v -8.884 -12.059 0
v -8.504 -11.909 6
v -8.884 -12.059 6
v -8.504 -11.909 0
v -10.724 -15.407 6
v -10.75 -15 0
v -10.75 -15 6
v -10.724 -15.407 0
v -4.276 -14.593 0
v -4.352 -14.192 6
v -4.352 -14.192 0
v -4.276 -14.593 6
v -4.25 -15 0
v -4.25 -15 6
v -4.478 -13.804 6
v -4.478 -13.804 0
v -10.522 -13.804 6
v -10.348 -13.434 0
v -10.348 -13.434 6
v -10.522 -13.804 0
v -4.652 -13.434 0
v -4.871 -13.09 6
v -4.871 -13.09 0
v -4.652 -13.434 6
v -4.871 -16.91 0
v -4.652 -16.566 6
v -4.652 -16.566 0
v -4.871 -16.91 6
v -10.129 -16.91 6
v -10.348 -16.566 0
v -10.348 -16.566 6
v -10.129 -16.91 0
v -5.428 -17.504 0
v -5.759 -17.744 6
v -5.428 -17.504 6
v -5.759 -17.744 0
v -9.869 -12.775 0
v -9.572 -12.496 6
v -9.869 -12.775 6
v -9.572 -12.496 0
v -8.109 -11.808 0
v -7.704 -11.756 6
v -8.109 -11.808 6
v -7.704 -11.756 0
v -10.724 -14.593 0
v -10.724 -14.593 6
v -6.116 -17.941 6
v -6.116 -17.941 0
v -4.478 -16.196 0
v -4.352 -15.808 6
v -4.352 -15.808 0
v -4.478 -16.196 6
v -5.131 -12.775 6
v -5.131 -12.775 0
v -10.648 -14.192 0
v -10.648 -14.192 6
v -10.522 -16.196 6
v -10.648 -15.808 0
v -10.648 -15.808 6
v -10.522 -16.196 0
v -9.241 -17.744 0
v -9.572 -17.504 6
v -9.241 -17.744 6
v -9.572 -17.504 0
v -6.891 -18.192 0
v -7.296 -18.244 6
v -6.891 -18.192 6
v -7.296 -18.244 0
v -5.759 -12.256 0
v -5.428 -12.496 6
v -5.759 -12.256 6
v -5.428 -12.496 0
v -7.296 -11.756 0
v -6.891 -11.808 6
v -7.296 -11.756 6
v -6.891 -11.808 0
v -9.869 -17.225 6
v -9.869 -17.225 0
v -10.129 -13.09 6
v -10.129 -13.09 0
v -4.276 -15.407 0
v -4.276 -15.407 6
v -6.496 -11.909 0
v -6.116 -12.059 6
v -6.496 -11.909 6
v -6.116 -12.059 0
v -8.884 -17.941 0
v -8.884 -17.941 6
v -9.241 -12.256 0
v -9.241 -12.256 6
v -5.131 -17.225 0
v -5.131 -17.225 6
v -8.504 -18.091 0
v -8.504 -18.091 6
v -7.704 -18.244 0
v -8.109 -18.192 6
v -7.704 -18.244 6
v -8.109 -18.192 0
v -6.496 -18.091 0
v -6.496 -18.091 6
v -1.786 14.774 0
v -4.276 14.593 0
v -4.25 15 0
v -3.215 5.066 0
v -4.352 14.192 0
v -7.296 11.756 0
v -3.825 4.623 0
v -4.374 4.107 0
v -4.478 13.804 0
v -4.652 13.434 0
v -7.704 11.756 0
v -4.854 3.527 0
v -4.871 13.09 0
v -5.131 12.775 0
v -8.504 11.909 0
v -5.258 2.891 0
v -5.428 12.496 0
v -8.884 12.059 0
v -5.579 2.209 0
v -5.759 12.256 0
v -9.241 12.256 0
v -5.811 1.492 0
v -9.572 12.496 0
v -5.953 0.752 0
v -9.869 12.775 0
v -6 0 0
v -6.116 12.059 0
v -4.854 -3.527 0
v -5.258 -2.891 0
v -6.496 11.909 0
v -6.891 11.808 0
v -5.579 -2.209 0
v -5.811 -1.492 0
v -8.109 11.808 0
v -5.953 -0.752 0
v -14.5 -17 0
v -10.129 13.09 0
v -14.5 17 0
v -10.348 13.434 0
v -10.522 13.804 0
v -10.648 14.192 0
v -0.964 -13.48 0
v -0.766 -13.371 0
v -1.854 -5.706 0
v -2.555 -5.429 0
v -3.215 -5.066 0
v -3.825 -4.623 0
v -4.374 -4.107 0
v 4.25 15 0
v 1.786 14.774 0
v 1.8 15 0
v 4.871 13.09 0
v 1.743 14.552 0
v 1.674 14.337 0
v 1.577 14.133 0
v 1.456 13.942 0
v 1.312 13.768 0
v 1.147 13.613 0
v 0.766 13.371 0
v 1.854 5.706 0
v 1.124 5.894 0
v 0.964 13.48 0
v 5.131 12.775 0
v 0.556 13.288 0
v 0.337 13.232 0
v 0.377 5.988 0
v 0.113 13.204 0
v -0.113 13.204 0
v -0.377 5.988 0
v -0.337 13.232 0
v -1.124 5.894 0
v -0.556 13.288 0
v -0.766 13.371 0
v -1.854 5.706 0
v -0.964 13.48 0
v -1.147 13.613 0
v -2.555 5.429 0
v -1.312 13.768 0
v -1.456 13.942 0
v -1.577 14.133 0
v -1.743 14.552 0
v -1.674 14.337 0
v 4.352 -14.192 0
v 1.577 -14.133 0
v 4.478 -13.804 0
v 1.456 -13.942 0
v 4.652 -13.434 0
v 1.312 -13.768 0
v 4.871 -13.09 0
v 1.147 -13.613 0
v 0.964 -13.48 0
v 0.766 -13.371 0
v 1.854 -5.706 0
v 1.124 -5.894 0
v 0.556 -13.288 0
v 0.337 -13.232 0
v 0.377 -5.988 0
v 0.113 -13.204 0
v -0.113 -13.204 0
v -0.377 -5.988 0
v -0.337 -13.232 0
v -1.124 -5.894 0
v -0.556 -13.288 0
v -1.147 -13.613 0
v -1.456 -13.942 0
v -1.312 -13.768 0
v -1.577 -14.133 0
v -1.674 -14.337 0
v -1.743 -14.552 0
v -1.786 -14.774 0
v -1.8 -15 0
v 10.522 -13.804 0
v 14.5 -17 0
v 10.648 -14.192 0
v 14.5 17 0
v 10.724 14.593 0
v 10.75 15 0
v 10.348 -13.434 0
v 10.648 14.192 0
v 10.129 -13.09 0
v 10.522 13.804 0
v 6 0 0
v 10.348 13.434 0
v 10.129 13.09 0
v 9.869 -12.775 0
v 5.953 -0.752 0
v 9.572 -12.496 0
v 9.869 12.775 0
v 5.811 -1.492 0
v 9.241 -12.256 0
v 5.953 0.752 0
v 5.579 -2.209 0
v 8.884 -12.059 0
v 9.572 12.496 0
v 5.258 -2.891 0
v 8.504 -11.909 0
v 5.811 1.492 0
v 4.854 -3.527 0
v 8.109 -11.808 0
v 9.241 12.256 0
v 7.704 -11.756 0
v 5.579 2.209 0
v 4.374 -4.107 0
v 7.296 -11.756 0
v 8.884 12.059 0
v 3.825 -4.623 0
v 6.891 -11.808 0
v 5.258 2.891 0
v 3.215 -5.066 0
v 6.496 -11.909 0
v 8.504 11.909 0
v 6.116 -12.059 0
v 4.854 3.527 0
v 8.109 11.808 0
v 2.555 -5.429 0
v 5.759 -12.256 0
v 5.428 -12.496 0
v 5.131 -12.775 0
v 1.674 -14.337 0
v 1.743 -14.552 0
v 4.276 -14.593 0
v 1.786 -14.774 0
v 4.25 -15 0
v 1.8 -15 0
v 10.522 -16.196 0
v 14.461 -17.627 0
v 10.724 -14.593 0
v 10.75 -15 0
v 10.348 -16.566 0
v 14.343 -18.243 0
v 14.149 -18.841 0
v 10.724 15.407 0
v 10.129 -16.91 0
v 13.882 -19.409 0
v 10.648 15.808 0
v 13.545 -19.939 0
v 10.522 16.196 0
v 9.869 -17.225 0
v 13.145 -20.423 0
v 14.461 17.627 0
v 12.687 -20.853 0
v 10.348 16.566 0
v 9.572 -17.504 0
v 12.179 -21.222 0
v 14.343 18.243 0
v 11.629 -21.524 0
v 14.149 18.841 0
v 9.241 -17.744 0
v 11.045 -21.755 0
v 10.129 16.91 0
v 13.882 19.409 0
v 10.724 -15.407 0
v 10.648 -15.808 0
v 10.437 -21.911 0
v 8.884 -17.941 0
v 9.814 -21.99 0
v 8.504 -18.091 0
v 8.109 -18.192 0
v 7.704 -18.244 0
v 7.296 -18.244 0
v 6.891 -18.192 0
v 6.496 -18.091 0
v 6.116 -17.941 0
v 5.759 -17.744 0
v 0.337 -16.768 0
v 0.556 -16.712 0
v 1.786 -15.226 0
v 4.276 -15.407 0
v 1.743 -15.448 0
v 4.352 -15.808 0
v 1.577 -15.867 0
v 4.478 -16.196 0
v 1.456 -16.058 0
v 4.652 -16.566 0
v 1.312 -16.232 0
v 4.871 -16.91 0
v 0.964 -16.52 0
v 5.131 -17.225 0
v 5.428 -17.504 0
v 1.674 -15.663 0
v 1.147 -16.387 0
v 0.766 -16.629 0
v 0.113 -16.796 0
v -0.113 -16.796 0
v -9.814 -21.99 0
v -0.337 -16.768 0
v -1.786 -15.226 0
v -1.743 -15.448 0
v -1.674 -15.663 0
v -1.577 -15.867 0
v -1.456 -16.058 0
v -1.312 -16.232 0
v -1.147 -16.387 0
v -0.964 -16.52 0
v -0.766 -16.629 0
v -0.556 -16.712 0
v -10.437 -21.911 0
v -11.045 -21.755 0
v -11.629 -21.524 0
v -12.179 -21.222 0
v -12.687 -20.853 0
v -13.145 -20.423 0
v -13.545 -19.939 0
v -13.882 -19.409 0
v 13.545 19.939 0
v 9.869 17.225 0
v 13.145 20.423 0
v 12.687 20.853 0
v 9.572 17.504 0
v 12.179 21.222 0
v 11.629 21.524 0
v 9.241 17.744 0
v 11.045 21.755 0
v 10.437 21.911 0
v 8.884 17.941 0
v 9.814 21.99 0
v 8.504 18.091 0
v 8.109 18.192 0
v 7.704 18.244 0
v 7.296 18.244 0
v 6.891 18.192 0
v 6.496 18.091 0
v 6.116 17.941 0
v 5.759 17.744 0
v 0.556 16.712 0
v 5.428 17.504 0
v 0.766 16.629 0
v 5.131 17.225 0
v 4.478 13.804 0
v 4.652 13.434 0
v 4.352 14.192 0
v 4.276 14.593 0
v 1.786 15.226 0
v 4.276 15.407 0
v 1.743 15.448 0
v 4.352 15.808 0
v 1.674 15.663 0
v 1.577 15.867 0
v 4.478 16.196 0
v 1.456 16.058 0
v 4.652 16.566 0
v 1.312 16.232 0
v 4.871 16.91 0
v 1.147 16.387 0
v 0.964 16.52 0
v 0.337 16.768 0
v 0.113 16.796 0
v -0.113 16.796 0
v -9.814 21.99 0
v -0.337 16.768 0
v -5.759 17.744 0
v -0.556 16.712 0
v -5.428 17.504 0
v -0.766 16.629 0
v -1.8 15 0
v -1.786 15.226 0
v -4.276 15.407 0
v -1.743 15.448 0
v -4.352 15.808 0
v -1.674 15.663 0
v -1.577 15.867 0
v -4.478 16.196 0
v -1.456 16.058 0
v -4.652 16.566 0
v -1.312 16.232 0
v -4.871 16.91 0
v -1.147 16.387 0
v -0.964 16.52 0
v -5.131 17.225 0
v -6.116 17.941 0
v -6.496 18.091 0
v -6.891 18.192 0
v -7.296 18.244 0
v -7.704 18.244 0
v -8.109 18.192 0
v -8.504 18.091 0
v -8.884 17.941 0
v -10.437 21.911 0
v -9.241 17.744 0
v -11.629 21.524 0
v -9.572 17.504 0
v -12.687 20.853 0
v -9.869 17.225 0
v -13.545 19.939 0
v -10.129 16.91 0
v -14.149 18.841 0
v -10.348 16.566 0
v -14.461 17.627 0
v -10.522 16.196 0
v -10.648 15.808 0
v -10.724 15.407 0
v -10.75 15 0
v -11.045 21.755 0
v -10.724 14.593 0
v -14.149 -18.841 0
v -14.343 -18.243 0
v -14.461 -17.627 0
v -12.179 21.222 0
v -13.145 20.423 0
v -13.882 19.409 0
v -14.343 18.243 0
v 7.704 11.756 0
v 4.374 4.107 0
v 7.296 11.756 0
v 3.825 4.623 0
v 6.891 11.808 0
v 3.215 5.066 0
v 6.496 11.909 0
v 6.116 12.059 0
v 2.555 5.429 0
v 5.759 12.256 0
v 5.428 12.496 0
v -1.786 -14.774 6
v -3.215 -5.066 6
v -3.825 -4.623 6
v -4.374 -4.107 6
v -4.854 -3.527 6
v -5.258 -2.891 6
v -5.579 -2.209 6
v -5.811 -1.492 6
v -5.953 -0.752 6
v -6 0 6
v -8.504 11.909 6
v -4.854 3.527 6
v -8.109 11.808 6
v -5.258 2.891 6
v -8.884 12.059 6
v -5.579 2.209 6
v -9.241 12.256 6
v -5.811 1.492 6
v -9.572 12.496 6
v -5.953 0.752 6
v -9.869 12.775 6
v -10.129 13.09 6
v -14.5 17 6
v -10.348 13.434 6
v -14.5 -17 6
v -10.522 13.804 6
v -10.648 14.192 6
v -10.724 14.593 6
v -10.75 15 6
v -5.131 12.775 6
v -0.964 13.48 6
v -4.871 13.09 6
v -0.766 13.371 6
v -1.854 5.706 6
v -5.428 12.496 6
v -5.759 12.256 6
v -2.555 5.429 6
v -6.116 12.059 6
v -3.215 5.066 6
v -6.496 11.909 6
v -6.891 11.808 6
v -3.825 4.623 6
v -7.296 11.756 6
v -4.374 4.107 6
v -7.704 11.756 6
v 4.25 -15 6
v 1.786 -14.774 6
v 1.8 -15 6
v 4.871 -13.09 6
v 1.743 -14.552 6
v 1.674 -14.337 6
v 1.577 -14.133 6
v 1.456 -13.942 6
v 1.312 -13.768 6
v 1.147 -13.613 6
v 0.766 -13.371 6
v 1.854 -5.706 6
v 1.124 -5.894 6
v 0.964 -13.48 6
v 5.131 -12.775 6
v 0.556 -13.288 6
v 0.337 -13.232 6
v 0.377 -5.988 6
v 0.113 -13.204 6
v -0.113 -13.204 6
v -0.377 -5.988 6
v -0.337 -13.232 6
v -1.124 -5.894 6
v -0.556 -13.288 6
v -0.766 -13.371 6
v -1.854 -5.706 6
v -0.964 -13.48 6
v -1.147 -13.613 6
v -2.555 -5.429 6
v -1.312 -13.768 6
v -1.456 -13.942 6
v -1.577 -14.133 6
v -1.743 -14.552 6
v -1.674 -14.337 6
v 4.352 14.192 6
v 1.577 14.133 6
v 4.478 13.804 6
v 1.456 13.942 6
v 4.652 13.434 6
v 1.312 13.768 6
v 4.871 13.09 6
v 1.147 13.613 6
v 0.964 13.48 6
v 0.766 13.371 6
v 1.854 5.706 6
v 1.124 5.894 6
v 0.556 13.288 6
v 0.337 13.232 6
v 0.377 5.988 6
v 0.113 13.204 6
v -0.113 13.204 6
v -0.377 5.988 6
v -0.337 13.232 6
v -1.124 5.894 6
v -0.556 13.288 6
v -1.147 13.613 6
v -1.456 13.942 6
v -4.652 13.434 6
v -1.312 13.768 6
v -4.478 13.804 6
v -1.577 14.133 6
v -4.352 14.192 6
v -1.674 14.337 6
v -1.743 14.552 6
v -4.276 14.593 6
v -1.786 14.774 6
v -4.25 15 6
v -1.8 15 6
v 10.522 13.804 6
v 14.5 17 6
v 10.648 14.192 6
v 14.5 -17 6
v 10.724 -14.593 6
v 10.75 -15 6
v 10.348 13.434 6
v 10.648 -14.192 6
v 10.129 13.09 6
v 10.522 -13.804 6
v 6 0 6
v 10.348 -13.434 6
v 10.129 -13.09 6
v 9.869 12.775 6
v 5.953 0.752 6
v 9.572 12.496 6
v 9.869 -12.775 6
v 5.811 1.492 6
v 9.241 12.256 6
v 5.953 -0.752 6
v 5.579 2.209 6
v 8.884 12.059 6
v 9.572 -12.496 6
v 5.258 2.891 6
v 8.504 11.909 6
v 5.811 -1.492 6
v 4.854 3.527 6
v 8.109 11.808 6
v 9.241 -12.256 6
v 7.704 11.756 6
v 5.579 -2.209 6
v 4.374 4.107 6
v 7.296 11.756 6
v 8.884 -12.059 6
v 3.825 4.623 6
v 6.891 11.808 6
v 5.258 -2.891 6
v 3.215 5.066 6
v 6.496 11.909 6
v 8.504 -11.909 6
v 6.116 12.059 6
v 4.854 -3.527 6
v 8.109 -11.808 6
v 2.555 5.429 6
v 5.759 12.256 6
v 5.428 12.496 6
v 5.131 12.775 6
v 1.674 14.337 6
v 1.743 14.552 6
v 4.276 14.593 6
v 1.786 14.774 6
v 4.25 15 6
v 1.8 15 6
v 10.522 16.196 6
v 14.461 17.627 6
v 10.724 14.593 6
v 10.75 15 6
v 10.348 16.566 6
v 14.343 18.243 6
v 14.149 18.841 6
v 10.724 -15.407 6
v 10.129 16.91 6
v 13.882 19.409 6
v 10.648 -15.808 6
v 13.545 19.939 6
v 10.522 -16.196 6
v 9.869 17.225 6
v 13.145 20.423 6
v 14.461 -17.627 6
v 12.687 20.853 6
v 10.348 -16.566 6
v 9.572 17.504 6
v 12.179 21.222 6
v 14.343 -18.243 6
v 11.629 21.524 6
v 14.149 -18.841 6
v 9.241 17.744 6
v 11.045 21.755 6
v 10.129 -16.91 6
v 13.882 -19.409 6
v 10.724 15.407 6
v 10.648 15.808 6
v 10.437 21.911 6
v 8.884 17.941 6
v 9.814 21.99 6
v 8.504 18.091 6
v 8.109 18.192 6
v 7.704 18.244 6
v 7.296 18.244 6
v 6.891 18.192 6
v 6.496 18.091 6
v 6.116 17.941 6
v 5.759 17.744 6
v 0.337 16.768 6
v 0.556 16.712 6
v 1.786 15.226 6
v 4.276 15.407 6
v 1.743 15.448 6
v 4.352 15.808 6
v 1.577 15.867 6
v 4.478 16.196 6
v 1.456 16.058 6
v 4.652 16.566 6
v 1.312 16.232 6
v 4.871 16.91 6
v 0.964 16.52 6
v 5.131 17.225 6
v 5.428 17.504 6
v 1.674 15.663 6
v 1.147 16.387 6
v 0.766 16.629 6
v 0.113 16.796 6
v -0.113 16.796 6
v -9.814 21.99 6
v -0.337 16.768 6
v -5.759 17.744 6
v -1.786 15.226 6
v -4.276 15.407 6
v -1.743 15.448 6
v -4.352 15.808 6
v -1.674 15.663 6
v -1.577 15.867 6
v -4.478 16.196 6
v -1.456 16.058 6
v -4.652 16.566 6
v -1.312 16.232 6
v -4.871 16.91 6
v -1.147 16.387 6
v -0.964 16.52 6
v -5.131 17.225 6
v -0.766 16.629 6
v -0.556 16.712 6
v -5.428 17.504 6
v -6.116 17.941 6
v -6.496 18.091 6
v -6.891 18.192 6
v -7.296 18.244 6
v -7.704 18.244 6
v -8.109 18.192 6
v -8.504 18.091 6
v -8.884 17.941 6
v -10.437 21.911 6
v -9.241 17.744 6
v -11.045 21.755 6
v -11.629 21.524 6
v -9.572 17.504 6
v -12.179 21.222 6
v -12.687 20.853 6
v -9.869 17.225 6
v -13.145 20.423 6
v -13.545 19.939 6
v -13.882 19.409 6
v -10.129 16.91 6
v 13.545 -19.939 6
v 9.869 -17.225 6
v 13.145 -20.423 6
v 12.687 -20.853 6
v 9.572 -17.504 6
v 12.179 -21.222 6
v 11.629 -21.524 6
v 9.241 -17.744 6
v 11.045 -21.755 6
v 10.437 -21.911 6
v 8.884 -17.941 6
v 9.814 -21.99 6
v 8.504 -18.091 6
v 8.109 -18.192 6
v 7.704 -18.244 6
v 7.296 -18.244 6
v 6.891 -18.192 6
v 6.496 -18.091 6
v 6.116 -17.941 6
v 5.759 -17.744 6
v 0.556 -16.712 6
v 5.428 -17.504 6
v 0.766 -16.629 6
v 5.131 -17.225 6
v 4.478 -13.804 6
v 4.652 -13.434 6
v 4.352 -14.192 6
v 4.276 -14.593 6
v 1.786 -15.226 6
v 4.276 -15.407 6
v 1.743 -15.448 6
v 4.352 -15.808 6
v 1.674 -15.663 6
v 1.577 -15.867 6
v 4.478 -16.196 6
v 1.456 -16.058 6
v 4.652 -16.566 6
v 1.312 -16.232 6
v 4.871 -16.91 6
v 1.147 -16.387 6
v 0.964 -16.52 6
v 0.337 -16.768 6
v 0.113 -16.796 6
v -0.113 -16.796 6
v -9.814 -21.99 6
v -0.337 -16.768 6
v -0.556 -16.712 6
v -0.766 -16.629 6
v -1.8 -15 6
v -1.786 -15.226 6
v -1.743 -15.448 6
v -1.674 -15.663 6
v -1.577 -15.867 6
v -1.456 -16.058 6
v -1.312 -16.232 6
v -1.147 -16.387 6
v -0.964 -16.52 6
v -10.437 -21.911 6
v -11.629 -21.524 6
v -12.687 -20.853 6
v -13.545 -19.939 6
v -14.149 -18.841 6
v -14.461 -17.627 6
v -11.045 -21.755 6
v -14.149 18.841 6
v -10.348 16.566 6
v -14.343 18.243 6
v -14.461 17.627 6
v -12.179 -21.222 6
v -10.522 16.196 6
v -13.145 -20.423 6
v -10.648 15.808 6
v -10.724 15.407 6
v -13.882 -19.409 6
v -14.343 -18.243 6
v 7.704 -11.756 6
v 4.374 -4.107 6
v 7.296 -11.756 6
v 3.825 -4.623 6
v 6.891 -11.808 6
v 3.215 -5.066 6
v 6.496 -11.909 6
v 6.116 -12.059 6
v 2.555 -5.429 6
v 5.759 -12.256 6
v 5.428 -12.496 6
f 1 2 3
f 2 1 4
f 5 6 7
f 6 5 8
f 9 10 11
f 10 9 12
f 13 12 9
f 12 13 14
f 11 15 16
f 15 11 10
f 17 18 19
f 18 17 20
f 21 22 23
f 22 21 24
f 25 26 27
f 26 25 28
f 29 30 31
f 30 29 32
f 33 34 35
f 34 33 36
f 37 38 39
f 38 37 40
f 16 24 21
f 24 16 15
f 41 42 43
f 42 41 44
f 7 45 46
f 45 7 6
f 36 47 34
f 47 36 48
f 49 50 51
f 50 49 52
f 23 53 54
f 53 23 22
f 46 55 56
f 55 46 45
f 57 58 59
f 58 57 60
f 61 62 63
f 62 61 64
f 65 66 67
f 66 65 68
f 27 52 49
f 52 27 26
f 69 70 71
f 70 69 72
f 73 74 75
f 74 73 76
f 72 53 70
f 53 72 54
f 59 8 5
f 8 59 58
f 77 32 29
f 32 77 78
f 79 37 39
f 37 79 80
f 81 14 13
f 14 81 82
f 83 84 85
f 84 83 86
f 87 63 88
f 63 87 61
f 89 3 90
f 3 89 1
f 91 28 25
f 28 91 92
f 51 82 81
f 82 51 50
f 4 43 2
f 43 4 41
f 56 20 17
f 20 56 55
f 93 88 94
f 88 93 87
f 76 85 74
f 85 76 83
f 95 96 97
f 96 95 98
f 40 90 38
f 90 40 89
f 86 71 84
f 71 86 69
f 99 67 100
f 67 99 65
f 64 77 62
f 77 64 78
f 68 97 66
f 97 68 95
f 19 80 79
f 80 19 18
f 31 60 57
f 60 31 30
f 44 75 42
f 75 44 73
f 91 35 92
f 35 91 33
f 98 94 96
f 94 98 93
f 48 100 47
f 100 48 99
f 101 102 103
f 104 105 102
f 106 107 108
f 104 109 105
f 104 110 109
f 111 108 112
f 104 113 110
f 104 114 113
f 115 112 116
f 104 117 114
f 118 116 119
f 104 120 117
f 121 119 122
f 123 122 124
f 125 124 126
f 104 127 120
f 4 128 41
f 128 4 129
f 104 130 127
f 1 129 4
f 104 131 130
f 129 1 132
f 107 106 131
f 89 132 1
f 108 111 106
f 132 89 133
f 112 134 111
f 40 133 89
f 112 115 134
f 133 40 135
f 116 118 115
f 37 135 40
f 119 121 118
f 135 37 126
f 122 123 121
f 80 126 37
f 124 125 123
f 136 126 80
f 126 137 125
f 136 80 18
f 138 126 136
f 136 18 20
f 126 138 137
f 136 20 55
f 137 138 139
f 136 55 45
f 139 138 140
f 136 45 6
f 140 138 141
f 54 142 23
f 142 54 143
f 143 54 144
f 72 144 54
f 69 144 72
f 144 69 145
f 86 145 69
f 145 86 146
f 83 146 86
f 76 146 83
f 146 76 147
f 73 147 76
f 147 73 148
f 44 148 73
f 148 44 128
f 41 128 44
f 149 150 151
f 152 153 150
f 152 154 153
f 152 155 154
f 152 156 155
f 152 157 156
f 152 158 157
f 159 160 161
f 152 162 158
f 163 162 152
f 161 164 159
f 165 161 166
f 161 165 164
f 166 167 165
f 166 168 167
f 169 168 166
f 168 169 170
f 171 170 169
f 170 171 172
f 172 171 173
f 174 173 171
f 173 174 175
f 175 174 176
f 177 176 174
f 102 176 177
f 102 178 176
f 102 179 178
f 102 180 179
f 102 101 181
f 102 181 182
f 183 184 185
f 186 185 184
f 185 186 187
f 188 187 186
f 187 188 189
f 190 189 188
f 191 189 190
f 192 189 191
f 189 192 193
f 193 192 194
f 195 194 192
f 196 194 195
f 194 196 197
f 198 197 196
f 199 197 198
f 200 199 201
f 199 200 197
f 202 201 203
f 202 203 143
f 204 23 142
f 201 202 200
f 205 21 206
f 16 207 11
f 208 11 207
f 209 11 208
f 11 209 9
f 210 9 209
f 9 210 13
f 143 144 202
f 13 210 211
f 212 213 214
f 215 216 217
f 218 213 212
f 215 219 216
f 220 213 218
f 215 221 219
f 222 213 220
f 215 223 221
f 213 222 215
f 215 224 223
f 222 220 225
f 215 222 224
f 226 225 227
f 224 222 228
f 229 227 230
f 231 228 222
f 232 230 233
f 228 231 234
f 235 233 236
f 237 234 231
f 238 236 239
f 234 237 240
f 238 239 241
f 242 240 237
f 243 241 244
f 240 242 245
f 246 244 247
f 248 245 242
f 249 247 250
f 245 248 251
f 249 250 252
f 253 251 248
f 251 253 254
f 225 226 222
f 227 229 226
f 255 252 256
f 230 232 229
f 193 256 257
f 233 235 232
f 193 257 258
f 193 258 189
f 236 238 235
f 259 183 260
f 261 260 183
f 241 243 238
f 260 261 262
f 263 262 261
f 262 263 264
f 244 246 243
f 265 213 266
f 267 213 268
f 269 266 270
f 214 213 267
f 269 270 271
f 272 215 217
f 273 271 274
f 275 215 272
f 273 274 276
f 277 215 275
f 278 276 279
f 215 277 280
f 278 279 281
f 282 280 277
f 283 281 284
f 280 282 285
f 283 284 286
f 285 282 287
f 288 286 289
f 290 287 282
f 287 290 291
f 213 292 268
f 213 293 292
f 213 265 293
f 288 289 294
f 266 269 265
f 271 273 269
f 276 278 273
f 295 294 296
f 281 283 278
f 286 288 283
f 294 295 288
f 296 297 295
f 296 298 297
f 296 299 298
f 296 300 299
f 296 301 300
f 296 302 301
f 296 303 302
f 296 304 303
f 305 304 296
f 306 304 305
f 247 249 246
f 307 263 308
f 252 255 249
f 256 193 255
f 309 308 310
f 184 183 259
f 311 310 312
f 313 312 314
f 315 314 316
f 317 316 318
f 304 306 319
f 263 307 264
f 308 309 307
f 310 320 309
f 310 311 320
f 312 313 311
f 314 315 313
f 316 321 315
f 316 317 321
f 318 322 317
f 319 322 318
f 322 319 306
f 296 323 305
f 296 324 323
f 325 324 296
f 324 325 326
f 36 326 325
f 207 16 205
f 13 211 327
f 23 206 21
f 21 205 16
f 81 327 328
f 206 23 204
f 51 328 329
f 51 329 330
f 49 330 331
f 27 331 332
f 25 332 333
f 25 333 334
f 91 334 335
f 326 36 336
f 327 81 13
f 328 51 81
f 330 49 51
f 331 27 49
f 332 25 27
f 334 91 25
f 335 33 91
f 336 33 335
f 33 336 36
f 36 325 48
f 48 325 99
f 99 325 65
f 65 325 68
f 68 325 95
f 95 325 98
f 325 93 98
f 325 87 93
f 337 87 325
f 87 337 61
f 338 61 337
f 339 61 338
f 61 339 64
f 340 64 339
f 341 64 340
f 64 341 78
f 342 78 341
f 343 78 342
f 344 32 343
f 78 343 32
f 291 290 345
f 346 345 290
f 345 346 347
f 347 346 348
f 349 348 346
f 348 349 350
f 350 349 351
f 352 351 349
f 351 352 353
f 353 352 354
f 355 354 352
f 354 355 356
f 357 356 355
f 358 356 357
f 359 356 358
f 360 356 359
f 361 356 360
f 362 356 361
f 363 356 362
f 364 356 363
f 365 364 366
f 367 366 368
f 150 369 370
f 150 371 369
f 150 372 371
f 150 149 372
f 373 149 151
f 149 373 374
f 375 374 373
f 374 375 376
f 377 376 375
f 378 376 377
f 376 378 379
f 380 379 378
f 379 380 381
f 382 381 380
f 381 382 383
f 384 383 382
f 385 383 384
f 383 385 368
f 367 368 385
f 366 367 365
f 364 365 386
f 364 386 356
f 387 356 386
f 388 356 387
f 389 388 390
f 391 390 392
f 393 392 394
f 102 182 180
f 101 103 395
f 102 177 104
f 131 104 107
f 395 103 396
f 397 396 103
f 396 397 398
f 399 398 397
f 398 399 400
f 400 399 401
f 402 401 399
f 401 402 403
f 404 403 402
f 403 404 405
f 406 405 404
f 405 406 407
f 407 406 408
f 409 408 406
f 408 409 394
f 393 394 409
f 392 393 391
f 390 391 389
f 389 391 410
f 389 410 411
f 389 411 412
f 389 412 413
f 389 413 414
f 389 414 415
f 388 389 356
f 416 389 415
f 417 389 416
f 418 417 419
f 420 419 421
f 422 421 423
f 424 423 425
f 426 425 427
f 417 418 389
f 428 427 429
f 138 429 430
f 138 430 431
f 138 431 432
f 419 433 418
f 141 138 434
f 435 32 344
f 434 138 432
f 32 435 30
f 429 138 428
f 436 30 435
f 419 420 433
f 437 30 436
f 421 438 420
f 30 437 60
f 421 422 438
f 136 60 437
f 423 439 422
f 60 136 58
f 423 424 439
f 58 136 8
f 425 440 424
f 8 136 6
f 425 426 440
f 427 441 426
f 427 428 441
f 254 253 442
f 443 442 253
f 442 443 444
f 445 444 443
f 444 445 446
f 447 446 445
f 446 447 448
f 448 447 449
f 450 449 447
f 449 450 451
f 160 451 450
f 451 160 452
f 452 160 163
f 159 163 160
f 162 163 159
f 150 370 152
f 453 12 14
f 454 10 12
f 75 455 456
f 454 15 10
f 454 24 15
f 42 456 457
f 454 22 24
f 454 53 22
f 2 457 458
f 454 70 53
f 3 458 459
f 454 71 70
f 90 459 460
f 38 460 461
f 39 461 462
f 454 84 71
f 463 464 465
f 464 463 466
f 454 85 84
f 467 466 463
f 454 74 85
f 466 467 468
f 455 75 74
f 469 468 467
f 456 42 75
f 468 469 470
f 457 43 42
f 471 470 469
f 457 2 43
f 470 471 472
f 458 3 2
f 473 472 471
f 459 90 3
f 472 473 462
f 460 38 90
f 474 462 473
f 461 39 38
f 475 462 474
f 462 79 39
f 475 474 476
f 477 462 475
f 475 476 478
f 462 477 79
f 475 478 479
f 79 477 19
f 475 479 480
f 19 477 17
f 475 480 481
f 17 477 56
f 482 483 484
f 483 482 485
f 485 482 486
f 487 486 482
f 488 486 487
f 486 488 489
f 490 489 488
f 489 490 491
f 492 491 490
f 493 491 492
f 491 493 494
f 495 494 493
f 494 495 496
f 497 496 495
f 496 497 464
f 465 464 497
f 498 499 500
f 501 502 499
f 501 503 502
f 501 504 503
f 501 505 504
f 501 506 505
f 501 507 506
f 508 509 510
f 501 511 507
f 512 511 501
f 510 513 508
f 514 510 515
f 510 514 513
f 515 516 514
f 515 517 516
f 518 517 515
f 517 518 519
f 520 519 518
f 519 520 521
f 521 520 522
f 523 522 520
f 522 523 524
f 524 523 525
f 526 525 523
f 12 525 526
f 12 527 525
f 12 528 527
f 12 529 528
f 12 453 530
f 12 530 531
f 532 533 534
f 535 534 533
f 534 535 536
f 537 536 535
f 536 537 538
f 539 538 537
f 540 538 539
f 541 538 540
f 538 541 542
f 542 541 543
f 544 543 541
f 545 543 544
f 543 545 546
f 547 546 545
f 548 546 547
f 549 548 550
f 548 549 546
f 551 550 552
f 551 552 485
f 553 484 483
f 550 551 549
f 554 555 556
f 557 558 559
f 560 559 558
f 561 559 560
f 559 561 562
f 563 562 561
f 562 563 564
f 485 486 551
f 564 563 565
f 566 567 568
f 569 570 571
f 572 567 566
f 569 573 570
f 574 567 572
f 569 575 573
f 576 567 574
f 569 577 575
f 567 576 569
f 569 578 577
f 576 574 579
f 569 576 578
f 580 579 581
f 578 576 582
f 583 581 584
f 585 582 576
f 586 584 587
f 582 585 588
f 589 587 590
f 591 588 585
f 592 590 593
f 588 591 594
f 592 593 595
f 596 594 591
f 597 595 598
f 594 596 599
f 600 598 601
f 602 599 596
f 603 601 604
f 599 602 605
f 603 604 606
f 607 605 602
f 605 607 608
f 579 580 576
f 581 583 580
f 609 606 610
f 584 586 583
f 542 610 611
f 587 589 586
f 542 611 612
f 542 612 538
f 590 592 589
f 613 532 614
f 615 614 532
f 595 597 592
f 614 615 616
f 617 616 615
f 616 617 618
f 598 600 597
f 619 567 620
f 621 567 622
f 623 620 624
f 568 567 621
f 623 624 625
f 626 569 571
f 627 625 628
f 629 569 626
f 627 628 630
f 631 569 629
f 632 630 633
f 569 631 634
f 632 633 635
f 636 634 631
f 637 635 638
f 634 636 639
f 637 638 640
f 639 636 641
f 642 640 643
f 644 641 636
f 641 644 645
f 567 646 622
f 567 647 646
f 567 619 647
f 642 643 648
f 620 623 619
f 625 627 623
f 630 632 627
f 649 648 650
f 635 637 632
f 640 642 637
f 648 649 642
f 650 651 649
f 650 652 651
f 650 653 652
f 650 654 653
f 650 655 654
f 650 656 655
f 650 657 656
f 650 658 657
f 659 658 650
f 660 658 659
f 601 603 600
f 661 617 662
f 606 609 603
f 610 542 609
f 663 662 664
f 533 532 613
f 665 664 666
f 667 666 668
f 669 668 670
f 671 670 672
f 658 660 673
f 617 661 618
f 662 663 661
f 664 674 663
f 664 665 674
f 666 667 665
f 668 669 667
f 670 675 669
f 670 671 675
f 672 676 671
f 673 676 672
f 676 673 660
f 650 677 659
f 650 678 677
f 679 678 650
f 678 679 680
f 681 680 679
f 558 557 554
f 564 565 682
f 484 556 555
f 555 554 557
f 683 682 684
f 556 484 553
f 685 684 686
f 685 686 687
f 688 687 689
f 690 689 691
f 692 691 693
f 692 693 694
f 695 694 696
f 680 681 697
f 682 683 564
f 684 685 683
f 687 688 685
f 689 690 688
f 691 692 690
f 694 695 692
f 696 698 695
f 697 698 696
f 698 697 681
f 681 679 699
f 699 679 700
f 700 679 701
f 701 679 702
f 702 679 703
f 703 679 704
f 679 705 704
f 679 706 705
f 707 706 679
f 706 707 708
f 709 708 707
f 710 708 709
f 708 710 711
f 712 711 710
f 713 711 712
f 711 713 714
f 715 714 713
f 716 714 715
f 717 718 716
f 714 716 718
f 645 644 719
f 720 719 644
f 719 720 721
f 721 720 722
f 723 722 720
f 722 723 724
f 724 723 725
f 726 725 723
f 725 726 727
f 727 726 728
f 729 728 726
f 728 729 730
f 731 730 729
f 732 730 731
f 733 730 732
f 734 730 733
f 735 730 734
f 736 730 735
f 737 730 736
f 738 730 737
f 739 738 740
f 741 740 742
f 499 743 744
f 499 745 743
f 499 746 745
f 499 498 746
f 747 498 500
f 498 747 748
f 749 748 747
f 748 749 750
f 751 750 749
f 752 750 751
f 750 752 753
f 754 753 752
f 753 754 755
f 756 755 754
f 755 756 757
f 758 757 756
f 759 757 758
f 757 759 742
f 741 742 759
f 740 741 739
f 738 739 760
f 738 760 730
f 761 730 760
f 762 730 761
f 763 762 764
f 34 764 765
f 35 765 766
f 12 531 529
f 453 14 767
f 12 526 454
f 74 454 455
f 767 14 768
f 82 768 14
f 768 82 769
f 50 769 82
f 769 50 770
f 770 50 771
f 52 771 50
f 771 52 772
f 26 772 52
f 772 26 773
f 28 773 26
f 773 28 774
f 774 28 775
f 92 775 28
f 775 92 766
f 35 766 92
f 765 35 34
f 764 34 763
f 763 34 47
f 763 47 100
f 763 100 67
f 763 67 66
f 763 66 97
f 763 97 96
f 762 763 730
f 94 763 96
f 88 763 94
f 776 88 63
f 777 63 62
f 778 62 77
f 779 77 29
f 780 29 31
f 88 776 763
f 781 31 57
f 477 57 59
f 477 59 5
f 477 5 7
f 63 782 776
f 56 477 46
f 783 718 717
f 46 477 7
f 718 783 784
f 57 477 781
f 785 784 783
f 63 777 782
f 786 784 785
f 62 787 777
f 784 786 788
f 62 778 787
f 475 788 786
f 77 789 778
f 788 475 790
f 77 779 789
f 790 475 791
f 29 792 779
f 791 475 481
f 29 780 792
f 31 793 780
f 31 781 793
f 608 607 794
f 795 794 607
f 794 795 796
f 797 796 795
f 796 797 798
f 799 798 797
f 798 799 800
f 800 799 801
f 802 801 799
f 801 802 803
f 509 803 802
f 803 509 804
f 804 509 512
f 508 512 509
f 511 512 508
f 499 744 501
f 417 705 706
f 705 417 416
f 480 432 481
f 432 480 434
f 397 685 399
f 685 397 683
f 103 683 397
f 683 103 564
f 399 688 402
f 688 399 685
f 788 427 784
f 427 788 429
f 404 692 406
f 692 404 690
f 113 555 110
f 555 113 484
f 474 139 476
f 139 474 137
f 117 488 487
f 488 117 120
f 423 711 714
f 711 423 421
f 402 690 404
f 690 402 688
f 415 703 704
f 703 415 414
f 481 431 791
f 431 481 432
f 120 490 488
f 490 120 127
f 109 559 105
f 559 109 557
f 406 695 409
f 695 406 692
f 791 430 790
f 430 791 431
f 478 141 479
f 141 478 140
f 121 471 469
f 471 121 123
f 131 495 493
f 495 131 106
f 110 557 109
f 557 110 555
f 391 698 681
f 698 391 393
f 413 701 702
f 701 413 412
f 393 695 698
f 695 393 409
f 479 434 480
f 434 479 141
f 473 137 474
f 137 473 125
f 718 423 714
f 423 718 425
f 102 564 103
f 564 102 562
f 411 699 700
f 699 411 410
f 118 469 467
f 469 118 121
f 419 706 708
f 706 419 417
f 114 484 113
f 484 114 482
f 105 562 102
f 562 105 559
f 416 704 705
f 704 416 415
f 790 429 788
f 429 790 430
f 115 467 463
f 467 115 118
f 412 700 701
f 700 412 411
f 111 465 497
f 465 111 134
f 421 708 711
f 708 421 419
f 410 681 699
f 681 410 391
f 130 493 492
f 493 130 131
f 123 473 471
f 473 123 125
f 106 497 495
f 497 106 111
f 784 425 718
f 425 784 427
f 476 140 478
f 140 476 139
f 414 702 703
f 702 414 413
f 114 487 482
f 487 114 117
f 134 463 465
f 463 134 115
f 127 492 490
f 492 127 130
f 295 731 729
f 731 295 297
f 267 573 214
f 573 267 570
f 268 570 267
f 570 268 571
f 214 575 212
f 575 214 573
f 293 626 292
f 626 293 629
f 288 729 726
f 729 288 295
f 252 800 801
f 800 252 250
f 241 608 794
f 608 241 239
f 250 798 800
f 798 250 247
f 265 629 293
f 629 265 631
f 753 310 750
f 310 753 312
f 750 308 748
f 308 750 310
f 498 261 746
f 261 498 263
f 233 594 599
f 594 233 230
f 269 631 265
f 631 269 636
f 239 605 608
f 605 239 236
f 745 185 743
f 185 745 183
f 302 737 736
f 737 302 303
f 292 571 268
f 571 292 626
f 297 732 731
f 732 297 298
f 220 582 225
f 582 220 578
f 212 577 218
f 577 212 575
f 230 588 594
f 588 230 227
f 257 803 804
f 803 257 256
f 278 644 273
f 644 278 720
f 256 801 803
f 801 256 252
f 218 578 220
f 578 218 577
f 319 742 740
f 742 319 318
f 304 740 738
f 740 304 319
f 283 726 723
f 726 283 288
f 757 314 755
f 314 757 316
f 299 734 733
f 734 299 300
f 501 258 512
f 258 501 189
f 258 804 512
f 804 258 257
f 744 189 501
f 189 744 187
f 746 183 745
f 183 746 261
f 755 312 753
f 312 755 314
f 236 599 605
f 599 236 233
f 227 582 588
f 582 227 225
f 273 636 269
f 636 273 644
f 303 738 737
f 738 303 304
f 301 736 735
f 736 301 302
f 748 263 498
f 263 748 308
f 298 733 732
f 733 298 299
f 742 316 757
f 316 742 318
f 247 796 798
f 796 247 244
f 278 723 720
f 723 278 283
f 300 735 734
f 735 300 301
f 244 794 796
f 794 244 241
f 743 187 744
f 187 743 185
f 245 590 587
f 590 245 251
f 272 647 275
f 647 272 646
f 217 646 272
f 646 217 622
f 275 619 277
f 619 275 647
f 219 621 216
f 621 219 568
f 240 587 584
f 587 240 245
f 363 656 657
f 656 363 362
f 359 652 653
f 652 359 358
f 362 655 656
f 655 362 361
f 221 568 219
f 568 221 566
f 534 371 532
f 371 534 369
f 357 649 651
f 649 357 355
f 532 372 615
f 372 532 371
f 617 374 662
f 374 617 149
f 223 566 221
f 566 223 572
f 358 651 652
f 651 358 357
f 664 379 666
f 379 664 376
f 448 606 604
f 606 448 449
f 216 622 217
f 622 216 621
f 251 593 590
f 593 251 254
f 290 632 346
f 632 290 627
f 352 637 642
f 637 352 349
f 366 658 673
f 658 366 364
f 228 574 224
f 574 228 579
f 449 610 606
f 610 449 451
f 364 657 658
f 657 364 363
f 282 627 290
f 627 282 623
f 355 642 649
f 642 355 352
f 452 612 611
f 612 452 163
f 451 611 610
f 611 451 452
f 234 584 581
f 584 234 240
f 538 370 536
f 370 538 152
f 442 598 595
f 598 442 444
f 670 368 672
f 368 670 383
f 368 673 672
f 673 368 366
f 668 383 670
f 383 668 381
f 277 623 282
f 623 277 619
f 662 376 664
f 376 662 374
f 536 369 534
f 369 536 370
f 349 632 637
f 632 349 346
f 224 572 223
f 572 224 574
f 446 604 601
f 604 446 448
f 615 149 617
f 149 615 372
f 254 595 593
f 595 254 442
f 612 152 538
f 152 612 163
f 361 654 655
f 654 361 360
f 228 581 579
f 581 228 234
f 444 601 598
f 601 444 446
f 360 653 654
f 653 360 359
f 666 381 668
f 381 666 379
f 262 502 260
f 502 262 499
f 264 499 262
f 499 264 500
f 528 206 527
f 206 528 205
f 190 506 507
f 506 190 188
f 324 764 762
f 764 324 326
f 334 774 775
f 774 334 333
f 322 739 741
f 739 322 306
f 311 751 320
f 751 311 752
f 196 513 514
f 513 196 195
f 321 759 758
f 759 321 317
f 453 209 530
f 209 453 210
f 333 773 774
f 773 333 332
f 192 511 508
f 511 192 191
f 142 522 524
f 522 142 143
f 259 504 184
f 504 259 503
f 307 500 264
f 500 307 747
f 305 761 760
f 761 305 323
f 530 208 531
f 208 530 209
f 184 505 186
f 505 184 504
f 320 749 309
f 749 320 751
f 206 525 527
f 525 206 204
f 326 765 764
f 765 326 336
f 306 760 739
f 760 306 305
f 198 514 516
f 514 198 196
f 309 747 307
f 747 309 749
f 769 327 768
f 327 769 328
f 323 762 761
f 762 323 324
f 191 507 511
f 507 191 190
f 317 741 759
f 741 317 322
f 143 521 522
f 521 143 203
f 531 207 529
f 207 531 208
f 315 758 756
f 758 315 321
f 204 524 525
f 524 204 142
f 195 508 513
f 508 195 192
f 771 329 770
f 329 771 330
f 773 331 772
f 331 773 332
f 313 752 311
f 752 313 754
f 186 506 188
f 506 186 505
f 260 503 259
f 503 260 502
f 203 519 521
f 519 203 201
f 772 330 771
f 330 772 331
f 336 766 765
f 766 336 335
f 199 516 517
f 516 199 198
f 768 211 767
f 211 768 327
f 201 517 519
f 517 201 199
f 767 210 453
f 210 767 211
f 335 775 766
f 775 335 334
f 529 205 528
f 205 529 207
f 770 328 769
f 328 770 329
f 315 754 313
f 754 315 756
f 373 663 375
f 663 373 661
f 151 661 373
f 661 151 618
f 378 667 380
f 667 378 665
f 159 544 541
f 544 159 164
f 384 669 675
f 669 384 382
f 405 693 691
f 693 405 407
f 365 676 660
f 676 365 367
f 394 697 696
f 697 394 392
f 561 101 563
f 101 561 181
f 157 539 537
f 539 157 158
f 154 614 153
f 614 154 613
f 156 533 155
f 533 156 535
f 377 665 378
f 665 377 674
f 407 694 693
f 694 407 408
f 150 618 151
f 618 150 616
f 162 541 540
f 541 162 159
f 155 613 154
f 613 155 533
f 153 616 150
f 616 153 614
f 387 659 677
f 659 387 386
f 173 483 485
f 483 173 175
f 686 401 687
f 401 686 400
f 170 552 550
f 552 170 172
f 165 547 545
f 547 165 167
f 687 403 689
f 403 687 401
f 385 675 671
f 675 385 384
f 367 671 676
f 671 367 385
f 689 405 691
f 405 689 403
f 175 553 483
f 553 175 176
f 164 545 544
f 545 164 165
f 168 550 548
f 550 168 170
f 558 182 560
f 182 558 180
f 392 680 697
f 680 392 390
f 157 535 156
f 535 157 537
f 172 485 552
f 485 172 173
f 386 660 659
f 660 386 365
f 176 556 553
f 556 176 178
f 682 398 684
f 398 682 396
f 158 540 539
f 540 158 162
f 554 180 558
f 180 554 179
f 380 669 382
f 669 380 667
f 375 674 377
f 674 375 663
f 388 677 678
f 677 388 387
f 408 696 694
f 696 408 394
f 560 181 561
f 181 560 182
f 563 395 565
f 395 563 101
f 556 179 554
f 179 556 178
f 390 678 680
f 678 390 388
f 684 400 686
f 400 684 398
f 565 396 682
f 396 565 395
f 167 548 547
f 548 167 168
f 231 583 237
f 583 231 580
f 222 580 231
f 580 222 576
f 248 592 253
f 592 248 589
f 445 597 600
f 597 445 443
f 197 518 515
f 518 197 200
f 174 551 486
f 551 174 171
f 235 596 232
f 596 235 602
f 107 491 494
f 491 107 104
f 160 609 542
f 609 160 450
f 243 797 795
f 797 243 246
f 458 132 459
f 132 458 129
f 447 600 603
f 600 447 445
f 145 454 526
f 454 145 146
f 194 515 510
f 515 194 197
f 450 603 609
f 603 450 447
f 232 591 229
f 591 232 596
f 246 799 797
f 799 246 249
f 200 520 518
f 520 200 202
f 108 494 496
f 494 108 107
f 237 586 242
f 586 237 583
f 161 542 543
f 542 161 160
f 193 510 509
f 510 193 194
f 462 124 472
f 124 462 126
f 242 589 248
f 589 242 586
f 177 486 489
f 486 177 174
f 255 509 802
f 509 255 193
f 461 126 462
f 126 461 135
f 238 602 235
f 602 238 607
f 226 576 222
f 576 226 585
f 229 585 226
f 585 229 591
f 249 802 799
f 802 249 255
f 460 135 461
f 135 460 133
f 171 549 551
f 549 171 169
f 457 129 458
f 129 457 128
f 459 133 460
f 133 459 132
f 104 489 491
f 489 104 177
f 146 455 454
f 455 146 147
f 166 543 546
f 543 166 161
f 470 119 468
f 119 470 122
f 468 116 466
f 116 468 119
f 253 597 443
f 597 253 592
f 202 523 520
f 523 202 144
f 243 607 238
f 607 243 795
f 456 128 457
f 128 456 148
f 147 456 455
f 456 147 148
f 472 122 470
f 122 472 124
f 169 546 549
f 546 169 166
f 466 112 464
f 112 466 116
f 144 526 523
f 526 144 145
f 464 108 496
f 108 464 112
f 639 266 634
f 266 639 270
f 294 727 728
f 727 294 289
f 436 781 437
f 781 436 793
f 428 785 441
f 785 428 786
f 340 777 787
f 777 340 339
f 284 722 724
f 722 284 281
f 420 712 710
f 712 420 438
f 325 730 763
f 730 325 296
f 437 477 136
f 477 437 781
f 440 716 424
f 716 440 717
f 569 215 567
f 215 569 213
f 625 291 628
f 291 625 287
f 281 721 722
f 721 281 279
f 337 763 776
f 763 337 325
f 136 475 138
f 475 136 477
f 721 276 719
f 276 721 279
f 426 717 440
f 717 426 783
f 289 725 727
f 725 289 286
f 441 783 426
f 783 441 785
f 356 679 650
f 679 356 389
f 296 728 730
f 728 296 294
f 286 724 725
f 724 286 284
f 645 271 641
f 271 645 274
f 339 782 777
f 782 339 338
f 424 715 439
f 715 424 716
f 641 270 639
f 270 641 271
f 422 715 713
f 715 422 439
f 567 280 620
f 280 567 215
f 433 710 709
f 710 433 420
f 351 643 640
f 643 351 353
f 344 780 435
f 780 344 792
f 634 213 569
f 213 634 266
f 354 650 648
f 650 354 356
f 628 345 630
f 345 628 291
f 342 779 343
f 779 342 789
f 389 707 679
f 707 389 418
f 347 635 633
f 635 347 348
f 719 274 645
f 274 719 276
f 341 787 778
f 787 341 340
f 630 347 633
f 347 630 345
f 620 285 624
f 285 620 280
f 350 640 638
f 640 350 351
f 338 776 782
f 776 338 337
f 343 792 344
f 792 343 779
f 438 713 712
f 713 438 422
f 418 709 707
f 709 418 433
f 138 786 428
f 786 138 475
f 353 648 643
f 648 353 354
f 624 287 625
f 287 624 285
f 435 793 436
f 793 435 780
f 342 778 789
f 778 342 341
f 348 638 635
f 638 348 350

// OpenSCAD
$fn = 50;

difference() {
	union() {
		hull() {
			translate(v = [-9.5, 17.0, 0]) {
				cylinder(h = 6, r = 5);
			}
			translate(v = [9.5, 17.0, 0]) {
				cylinder(h = 6, r = 5);
			}
			translate(v = [-9.5, -17.0, 0]) {
				cylinder(h = 6, r = 5);
			}
			translate(v = [9.5, -17.0, 0]) {
				cylinder(h = 6, r = 5);
			}
		}
	}
	union() {
		translate(v = [-7.5, -15.0, 0]) {
			cylinder(h = 6, r = 3.25);
		}
		translate(v = [-7.5, 15.0, 0]) {
			cylinder(h = 6, r = 3.25);
		}
		translate(v = [7.5, -15.0, 0]) {
			cylinder(h = 6, r = 3.25);
		}
		translate(v = [7.5, 15.0, 0]) {
			cylinder(h = 6, r = 3.25);
		}
		translate(v = [0.0, -15.0, 0]) {
			cylinder(h = 6, r = 1.8);
		}
		translate(v = [0.0, 15.0, 0]) {
			cylinder(h = 6, r = 1.8);
		}
		cylinder(h = 6, r = 6.0);
	}
}
